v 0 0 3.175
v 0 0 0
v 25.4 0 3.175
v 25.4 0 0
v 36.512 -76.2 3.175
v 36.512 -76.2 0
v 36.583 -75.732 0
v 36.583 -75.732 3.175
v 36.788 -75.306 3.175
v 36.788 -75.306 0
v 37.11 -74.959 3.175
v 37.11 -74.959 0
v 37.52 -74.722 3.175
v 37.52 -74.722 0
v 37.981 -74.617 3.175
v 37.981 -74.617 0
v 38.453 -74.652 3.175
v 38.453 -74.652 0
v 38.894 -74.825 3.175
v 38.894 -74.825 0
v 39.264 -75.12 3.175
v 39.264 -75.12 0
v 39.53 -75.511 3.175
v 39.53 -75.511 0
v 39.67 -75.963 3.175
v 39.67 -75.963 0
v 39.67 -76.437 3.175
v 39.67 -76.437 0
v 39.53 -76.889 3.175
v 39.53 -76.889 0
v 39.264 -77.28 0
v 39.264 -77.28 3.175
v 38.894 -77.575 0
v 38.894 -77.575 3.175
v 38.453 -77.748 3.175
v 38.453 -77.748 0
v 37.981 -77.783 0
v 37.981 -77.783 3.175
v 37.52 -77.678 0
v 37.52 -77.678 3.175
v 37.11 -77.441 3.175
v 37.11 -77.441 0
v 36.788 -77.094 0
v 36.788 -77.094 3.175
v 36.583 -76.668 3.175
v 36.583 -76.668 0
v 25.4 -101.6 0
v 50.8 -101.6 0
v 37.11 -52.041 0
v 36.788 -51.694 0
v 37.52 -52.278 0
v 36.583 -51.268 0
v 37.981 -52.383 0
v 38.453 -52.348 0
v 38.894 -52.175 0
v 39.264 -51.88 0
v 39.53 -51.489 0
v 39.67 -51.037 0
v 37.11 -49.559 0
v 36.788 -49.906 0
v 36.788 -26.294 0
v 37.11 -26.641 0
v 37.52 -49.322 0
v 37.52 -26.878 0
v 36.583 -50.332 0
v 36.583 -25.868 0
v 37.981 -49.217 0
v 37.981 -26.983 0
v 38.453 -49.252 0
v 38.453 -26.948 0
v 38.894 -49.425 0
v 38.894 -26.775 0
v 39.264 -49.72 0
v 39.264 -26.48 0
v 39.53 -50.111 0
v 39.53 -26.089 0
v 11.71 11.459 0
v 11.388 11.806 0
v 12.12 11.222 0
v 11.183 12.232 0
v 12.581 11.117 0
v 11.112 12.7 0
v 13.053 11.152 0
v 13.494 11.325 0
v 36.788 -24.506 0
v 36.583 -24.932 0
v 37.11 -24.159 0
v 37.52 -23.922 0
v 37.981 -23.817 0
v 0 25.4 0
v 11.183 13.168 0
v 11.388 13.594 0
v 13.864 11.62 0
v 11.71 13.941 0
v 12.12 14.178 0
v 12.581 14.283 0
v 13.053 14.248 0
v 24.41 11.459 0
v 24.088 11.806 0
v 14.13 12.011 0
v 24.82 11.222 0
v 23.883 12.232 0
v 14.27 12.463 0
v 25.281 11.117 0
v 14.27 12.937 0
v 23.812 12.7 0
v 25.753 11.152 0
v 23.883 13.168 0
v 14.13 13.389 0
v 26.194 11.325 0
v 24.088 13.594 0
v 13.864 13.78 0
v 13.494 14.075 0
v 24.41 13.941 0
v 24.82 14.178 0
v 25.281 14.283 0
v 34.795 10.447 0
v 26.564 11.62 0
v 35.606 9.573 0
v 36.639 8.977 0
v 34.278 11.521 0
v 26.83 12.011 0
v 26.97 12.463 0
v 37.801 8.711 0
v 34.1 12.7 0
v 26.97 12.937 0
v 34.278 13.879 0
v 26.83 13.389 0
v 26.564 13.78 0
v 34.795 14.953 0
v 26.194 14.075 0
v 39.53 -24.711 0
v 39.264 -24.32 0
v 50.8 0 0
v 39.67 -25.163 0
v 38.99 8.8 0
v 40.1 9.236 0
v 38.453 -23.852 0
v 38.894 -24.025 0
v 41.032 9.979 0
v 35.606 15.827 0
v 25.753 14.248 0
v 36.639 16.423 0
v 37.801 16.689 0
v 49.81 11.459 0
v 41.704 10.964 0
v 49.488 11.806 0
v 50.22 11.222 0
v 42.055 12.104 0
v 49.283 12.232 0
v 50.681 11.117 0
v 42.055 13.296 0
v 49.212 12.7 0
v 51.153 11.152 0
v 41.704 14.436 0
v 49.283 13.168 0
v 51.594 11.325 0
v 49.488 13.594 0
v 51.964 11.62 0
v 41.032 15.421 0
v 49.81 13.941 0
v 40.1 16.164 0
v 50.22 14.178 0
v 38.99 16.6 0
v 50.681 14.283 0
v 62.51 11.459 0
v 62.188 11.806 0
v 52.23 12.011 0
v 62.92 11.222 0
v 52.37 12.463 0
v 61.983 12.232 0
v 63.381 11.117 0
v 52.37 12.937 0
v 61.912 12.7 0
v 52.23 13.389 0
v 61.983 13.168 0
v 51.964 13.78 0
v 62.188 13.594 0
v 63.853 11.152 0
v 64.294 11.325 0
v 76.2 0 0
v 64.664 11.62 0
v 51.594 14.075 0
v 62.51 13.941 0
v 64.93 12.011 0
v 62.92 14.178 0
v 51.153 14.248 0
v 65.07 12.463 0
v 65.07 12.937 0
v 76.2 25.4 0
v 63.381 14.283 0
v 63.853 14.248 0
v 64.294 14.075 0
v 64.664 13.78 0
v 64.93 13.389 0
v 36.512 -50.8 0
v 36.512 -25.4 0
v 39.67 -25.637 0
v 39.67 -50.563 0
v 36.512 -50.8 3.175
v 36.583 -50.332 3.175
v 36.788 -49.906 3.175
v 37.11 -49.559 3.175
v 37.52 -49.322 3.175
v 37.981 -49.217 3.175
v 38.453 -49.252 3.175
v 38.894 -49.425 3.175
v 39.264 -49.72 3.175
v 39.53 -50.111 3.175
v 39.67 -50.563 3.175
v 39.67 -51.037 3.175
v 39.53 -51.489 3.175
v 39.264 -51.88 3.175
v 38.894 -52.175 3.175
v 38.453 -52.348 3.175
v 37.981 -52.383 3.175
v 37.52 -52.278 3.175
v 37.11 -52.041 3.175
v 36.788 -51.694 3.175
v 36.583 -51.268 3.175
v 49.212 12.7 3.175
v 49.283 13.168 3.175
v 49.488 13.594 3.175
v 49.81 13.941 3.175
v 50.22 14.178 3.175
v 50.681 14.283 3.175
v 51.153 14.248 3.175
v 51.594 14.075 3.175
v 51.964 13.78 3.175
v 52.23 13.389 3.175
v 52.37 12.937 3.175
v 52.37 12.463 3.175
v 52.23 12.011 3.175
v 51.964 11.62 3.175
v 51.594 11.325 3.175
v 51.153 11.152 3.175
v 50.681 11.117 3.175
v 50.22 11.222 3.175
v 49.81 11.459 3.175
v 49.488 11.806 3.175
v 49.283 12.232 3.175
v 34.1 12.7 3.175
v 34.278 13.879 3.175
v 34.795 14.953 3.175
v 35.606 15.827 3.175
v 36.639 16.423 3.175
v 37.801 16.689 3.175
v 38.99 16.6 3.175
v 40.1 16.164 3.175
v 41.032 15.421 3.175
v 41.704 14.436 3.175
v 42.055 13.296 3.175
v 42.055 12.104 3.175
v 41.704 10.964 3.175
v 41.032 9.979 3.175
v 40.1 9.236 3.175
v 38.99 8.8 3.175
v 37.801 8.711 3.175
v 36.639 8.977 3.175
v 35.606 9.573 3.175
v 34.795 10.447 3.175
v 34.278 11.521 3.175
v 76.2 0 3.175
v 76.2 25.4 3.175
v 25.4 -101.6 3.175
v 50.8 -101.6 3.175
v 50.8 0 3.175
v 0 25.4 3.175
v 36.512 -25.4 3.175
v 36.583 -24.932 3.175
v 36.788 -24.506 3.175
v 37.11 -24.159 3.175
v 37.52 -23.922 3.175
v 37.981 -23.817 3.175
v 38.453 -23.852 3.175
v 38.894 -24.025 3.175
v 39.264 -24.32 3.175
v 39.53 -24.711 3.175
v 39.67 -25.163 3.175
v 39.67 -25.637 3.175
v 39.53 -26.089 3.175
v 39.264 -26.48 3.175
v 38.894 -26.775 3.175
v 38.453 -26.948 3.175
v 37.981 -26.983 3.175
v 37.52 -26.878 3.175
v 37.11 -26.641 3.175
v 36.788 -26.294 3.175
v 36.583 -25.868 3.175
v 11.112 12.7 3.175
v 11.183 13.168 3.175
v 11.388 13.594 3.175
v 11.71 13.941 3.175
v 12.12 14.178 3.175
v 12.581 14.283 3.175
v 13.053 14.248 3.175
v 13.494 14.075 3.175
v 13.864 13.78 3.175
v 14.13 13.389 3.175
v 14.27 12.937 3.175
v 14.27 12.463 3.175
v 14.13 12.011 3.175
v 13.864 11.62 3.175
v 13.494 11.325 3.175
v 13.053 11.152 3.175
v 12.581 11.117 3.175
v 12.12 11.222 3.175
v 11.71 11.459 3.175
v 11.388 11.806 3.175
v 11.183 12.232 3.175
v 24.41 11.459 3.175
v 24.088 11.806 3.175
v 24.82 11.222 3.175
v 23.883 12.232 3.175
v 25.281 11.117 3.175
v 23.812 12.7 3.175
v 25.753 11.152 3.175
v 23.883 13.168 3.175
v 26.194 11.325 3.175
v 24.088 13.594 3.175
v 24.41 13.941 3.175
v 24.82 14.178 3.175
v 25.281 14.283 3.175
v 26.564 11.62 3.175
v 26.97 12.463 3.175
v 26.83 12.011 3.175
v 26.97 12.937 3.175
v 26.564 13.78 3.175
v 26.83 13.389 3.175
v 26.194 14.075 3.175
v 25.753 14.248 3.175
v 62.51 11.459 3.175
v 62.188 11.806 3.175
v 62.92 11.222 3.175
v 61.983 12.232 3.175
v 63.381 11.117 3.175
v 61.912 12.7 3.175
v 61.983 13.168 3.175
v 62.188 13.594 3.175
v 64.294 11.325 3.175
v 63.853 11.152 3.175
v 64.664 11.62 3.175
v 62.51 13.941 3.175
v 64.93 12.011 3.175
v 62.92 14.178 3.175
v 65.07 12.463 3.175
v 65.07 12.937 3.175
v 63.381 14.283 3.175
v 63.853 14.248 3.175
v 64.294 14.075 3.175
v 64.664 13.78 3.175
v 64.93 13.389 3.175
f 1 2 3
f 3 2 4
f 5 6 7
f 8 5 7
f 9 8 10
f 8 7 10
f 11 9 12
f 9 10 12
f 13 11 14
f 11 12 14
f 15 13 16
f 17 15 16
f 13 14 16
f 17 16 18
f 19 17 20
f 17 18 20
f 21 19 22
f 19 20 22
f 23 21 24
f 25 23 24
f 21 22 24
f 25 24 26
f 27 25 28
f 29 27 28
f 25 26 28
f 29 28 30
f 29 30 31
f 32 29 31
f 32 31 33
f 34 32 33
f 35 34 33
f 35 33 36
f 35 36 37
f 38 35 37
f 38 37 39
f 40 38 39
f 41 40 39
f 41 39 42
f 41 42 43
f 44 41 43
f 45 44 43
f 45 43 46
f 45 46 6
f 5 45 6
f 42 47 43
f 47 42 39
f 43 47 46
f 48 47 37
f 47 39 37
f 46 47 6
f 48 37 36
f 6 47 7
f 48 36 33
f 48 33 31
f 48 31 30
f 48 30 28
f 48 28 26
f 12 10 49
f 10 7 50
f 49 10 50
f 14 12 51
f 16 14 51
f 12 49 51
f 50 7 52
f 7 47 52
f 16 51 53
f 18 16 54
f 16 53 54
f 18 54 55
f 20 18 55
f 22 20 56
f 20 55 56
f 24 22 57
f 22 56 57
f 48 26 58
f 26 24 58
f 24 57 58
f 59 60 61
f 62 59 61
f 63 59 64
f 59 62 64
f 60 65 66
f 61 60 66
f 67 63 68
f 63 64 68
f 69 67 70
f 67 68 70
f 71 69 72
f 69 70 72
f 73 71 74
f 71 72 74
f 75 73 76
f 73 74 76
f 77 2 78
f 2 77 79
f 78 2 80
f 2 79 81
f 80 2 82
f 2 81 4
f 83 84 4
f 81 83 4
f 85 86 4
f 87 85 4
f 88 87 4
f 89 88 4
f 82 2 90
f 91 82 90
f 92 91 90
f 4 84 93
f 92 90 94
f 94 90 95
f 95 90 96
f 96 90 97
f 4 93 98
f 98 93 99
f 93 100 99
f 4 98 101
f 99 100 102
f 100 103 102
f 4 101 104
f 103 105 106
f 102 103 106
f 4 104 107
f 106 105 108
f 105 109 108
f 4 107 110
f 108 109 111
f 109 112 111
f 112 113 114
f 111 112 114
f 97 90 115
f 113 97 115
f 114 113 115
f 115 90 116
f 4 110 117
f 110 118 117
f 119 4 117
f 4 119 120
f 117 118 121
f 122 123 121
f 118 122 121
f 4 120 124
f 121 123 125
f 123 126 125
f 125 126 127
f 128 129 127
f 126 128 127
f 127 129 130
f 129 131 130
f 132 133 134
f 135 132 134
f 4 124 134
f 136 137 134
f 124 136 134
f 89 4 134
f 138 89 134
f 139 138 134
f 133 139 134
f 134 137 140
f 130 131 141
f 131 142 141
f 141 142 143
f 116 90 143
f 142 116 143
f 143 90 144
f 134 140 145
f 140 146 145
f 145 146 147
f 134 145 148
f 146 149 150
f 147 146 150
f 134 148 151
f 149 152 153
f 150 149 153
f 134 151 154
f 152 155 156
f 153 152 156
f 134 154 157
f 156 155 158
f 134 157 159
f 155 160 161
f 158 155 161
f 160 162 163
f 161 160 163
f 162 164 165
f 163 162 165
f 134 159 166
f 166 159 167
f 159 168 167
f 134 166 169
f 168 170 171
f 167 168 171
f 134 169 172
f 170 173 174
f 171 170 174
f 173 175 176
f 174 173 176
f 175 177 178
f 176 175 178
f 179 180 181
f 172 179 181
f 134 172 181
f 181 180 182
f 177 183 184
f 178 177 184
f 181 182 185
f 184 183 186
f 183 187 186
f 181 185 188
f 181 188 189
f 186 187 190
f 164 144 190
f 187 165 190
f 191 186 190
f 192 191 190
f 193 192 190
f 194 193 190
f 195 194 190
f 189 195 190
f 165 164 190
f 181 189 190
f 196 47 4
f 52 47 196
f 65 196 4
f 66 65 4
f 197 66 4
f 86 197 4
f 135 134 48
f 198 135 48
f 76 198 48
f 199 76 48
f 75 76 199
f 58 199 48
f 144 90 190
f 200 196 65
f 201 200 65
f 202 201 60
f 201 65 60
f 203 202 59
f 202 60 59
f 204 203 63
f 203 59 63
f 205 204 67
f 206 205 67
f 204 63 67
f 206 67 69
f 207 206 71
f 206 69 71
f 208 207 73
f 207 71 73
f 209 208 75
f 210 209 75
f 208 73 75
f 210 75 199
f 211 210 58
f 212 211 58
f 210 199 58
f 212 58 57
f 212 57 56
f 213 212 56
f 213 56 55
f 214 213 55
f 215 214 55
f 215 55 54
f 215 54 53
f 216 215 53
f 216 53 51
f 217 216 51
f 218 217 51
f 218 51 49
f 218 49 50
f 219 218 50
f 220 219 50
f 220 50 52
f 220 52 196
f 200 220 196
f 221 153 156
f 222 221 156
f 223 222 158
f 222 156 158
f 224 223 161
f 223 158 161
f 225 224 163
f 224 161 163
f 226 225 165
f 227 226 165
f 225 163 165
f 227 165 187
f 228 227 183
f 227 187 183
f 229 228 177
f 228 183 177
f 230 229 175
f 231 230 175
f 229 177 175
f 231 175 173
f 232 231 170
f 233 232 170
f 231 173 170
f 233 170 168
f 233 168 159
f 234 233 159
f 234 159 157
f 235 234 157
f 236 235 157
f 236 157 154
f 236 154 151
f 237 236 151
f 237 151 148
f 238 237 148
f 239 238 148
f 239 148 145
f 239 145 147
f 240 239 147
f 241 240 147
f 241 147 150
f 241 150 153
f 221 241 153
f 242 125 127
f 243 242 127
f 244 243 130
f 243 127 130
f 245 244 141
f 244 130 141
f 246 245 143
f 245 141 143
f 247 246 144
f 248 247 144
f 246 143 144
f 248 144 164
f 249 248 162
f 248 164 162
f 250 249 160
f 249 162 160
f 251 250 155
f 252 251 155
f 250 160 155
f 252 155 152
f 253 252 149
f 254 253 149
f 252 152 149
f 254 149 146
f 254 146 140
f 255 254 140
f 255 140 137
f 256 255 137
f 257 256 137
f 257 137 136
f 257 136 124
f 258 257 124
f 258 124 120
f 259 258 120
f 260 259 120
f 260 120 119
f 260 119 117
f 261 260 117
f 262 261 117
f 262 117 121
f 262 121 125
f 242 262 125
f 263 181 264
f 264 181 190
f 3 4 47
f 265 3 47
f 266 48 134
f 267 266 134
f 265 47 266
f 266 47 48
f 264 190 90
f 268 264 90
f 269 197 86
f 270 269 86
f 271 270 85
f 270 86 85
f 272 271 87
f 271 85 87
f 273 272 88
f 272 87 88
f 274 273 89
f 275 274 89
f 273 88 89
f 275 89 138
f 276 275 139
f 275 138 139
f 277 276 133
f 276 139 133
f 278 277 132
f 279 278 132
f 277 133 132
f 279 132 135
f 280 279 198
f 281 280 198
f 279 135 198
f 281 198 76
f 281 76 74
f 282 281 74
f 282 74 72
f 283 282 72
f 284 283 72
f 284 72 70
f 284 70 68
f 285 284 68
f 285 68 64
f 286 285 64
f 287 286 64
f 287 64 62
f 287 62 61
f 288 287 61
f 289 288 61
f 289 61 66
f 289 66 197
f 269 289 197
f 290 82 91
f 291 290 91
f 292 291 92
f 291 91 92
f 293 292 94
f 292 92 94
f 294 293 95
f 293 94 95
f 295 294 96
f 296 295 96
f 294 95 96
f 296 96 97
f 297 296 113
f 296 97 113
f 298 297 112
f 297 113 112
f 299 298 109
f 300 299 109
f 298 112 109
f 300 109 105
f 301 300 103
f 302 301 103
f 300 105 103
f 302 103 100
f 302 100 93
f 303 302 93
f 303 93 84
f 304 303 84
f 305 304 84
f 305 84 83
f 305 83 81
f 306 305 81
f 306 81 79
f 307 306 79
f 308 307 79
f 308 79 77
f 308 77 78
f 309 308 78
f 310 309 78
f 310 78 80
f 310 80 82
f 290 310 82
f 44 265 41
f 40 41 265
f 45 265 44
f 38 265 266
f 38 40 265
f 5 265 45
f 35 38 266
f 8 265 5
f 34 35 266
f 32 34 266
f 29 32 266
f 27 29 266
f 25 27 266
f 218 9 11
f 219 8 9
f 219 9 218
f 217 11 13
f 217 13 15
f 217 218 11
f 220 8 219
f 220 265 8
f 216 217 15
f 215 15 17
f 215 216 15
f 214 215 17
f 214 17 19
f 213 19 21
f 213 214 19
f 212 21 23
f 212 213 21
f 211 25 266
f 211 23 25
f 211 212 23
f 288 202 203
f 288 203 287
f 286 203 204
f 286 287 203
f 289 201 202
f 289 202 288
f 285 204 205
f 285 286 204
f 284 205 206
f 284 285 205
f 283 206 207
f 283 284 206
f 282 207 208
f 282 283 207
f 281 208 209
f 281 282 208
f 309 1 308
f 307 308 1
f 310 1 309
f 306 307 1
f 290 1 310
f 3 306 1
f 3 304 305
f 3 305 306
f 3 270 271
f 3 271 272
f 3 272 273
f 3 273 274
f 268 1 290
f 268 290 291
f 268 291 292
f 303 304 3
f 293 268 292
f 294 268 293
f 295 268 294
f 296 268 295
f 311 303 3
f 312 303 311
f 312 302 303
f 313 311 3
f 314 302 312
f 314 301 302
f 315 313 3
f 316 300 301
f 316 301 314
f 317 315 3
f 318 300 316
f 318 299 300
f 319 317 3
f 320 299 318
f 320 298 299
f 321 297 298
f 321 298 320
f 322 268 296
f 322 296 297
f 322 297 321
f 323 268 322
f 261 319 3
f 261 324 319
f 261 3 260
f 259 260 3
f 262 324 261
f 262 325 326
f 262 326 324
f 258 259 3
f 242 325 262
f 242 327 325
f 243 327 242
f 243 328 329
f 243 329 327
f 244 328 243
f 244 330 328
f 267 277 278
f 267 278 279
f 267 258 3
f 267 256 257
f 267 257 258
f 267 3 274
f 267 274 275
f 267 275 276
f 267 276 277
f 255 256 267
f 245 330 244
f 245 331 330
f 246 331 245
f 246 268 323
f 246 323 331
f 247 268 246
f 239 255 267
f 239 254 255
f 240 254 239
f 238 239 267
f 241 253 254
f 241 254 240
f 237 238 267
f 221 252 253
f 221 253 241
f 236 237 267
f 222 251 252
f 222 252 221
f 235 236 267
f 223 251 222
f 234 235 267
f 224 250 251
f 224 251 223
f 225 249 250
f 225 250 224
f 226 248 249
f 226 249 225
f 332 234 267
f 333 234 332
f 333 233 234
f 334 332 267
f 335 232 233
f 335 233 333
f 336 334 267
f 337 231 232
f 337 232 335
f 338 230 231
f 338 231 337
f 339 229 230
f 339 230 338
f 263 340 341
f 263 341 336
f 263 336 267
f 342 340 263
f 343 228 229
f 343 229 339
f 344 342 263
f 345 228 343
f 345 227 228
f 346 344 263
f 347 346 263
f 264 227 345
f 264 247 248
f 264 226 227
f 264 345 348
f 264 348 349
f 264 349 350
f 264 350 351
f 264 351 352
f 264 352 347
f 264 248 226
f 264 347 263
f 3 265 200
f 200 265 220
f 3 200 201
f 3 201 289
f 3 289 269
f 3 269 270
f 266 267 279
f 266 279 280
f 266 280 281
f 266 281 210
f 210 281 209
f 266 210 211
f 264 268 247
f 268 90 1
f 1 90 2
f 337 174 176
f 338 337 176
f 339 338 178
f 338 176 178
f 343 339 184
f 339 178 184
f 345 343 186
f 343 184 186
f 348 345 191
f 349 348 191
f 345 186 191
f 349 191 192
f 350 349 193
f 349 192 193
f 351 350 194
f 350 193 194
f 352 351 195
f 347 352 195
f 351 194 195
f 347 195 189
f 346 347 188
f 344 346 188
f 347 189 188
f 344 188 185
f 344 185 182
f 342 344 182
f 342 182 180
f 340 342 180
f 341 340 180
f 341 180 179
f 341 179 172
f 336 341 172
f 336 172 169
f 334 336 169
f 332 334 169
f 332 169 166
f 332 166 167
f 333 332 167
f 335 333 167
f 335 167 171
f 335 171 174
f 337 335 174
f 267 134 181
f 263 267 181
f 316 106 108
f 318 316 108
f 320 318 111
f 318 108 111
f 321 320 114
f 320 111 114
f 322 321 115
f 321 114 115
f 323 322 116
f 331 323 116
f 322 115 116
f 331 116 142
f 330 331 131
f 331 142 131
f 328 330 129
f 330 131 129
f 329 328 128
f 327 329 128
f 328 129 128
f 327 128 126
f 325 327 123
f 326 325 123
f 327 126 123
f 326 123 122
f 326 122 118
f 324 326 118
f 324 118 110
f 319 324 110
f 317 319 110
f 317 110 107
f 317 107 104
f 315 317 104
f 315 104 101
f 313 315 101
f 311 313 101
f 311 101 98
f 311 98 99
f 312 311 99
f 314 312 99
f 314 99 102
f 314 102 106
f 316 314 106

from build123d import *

# Parameters (mm, degrees)
F1_DEPTH = 3.175
F3_D     = 3.175
F5_D     = 8


with BuildPart() as f1:
    # F0 (on Top) → F1 (new body)
    with BuildSketch(Plane.XY):
        Polygon((0, 25.4), (0, 0), (25.4, 0), (25.4, -101.6), (50.8, -101.6), (50.8, 0), (76.2, 0), (76.2, 25.4), align=None)
    extrude(amount=F1_DEPTH)

    # F3 (through all)
    with Locations(Plane.XY.offset(3.175)):
        with Locations((12.7, 12.7), (25.4, 12.7), (50.8, 12.7), (63.5, 12.7), (38.1, -25.4), (38.1, -50.8), (38.1, -76.2)):
            Hole(F3_D / 2)

    # F5 (through all)
    with Locations(Plane.XY.offset(3.175)):
        with Locations((38.1, 12.7)):
            Hole(F5_D / 2)


solid = f1.part
